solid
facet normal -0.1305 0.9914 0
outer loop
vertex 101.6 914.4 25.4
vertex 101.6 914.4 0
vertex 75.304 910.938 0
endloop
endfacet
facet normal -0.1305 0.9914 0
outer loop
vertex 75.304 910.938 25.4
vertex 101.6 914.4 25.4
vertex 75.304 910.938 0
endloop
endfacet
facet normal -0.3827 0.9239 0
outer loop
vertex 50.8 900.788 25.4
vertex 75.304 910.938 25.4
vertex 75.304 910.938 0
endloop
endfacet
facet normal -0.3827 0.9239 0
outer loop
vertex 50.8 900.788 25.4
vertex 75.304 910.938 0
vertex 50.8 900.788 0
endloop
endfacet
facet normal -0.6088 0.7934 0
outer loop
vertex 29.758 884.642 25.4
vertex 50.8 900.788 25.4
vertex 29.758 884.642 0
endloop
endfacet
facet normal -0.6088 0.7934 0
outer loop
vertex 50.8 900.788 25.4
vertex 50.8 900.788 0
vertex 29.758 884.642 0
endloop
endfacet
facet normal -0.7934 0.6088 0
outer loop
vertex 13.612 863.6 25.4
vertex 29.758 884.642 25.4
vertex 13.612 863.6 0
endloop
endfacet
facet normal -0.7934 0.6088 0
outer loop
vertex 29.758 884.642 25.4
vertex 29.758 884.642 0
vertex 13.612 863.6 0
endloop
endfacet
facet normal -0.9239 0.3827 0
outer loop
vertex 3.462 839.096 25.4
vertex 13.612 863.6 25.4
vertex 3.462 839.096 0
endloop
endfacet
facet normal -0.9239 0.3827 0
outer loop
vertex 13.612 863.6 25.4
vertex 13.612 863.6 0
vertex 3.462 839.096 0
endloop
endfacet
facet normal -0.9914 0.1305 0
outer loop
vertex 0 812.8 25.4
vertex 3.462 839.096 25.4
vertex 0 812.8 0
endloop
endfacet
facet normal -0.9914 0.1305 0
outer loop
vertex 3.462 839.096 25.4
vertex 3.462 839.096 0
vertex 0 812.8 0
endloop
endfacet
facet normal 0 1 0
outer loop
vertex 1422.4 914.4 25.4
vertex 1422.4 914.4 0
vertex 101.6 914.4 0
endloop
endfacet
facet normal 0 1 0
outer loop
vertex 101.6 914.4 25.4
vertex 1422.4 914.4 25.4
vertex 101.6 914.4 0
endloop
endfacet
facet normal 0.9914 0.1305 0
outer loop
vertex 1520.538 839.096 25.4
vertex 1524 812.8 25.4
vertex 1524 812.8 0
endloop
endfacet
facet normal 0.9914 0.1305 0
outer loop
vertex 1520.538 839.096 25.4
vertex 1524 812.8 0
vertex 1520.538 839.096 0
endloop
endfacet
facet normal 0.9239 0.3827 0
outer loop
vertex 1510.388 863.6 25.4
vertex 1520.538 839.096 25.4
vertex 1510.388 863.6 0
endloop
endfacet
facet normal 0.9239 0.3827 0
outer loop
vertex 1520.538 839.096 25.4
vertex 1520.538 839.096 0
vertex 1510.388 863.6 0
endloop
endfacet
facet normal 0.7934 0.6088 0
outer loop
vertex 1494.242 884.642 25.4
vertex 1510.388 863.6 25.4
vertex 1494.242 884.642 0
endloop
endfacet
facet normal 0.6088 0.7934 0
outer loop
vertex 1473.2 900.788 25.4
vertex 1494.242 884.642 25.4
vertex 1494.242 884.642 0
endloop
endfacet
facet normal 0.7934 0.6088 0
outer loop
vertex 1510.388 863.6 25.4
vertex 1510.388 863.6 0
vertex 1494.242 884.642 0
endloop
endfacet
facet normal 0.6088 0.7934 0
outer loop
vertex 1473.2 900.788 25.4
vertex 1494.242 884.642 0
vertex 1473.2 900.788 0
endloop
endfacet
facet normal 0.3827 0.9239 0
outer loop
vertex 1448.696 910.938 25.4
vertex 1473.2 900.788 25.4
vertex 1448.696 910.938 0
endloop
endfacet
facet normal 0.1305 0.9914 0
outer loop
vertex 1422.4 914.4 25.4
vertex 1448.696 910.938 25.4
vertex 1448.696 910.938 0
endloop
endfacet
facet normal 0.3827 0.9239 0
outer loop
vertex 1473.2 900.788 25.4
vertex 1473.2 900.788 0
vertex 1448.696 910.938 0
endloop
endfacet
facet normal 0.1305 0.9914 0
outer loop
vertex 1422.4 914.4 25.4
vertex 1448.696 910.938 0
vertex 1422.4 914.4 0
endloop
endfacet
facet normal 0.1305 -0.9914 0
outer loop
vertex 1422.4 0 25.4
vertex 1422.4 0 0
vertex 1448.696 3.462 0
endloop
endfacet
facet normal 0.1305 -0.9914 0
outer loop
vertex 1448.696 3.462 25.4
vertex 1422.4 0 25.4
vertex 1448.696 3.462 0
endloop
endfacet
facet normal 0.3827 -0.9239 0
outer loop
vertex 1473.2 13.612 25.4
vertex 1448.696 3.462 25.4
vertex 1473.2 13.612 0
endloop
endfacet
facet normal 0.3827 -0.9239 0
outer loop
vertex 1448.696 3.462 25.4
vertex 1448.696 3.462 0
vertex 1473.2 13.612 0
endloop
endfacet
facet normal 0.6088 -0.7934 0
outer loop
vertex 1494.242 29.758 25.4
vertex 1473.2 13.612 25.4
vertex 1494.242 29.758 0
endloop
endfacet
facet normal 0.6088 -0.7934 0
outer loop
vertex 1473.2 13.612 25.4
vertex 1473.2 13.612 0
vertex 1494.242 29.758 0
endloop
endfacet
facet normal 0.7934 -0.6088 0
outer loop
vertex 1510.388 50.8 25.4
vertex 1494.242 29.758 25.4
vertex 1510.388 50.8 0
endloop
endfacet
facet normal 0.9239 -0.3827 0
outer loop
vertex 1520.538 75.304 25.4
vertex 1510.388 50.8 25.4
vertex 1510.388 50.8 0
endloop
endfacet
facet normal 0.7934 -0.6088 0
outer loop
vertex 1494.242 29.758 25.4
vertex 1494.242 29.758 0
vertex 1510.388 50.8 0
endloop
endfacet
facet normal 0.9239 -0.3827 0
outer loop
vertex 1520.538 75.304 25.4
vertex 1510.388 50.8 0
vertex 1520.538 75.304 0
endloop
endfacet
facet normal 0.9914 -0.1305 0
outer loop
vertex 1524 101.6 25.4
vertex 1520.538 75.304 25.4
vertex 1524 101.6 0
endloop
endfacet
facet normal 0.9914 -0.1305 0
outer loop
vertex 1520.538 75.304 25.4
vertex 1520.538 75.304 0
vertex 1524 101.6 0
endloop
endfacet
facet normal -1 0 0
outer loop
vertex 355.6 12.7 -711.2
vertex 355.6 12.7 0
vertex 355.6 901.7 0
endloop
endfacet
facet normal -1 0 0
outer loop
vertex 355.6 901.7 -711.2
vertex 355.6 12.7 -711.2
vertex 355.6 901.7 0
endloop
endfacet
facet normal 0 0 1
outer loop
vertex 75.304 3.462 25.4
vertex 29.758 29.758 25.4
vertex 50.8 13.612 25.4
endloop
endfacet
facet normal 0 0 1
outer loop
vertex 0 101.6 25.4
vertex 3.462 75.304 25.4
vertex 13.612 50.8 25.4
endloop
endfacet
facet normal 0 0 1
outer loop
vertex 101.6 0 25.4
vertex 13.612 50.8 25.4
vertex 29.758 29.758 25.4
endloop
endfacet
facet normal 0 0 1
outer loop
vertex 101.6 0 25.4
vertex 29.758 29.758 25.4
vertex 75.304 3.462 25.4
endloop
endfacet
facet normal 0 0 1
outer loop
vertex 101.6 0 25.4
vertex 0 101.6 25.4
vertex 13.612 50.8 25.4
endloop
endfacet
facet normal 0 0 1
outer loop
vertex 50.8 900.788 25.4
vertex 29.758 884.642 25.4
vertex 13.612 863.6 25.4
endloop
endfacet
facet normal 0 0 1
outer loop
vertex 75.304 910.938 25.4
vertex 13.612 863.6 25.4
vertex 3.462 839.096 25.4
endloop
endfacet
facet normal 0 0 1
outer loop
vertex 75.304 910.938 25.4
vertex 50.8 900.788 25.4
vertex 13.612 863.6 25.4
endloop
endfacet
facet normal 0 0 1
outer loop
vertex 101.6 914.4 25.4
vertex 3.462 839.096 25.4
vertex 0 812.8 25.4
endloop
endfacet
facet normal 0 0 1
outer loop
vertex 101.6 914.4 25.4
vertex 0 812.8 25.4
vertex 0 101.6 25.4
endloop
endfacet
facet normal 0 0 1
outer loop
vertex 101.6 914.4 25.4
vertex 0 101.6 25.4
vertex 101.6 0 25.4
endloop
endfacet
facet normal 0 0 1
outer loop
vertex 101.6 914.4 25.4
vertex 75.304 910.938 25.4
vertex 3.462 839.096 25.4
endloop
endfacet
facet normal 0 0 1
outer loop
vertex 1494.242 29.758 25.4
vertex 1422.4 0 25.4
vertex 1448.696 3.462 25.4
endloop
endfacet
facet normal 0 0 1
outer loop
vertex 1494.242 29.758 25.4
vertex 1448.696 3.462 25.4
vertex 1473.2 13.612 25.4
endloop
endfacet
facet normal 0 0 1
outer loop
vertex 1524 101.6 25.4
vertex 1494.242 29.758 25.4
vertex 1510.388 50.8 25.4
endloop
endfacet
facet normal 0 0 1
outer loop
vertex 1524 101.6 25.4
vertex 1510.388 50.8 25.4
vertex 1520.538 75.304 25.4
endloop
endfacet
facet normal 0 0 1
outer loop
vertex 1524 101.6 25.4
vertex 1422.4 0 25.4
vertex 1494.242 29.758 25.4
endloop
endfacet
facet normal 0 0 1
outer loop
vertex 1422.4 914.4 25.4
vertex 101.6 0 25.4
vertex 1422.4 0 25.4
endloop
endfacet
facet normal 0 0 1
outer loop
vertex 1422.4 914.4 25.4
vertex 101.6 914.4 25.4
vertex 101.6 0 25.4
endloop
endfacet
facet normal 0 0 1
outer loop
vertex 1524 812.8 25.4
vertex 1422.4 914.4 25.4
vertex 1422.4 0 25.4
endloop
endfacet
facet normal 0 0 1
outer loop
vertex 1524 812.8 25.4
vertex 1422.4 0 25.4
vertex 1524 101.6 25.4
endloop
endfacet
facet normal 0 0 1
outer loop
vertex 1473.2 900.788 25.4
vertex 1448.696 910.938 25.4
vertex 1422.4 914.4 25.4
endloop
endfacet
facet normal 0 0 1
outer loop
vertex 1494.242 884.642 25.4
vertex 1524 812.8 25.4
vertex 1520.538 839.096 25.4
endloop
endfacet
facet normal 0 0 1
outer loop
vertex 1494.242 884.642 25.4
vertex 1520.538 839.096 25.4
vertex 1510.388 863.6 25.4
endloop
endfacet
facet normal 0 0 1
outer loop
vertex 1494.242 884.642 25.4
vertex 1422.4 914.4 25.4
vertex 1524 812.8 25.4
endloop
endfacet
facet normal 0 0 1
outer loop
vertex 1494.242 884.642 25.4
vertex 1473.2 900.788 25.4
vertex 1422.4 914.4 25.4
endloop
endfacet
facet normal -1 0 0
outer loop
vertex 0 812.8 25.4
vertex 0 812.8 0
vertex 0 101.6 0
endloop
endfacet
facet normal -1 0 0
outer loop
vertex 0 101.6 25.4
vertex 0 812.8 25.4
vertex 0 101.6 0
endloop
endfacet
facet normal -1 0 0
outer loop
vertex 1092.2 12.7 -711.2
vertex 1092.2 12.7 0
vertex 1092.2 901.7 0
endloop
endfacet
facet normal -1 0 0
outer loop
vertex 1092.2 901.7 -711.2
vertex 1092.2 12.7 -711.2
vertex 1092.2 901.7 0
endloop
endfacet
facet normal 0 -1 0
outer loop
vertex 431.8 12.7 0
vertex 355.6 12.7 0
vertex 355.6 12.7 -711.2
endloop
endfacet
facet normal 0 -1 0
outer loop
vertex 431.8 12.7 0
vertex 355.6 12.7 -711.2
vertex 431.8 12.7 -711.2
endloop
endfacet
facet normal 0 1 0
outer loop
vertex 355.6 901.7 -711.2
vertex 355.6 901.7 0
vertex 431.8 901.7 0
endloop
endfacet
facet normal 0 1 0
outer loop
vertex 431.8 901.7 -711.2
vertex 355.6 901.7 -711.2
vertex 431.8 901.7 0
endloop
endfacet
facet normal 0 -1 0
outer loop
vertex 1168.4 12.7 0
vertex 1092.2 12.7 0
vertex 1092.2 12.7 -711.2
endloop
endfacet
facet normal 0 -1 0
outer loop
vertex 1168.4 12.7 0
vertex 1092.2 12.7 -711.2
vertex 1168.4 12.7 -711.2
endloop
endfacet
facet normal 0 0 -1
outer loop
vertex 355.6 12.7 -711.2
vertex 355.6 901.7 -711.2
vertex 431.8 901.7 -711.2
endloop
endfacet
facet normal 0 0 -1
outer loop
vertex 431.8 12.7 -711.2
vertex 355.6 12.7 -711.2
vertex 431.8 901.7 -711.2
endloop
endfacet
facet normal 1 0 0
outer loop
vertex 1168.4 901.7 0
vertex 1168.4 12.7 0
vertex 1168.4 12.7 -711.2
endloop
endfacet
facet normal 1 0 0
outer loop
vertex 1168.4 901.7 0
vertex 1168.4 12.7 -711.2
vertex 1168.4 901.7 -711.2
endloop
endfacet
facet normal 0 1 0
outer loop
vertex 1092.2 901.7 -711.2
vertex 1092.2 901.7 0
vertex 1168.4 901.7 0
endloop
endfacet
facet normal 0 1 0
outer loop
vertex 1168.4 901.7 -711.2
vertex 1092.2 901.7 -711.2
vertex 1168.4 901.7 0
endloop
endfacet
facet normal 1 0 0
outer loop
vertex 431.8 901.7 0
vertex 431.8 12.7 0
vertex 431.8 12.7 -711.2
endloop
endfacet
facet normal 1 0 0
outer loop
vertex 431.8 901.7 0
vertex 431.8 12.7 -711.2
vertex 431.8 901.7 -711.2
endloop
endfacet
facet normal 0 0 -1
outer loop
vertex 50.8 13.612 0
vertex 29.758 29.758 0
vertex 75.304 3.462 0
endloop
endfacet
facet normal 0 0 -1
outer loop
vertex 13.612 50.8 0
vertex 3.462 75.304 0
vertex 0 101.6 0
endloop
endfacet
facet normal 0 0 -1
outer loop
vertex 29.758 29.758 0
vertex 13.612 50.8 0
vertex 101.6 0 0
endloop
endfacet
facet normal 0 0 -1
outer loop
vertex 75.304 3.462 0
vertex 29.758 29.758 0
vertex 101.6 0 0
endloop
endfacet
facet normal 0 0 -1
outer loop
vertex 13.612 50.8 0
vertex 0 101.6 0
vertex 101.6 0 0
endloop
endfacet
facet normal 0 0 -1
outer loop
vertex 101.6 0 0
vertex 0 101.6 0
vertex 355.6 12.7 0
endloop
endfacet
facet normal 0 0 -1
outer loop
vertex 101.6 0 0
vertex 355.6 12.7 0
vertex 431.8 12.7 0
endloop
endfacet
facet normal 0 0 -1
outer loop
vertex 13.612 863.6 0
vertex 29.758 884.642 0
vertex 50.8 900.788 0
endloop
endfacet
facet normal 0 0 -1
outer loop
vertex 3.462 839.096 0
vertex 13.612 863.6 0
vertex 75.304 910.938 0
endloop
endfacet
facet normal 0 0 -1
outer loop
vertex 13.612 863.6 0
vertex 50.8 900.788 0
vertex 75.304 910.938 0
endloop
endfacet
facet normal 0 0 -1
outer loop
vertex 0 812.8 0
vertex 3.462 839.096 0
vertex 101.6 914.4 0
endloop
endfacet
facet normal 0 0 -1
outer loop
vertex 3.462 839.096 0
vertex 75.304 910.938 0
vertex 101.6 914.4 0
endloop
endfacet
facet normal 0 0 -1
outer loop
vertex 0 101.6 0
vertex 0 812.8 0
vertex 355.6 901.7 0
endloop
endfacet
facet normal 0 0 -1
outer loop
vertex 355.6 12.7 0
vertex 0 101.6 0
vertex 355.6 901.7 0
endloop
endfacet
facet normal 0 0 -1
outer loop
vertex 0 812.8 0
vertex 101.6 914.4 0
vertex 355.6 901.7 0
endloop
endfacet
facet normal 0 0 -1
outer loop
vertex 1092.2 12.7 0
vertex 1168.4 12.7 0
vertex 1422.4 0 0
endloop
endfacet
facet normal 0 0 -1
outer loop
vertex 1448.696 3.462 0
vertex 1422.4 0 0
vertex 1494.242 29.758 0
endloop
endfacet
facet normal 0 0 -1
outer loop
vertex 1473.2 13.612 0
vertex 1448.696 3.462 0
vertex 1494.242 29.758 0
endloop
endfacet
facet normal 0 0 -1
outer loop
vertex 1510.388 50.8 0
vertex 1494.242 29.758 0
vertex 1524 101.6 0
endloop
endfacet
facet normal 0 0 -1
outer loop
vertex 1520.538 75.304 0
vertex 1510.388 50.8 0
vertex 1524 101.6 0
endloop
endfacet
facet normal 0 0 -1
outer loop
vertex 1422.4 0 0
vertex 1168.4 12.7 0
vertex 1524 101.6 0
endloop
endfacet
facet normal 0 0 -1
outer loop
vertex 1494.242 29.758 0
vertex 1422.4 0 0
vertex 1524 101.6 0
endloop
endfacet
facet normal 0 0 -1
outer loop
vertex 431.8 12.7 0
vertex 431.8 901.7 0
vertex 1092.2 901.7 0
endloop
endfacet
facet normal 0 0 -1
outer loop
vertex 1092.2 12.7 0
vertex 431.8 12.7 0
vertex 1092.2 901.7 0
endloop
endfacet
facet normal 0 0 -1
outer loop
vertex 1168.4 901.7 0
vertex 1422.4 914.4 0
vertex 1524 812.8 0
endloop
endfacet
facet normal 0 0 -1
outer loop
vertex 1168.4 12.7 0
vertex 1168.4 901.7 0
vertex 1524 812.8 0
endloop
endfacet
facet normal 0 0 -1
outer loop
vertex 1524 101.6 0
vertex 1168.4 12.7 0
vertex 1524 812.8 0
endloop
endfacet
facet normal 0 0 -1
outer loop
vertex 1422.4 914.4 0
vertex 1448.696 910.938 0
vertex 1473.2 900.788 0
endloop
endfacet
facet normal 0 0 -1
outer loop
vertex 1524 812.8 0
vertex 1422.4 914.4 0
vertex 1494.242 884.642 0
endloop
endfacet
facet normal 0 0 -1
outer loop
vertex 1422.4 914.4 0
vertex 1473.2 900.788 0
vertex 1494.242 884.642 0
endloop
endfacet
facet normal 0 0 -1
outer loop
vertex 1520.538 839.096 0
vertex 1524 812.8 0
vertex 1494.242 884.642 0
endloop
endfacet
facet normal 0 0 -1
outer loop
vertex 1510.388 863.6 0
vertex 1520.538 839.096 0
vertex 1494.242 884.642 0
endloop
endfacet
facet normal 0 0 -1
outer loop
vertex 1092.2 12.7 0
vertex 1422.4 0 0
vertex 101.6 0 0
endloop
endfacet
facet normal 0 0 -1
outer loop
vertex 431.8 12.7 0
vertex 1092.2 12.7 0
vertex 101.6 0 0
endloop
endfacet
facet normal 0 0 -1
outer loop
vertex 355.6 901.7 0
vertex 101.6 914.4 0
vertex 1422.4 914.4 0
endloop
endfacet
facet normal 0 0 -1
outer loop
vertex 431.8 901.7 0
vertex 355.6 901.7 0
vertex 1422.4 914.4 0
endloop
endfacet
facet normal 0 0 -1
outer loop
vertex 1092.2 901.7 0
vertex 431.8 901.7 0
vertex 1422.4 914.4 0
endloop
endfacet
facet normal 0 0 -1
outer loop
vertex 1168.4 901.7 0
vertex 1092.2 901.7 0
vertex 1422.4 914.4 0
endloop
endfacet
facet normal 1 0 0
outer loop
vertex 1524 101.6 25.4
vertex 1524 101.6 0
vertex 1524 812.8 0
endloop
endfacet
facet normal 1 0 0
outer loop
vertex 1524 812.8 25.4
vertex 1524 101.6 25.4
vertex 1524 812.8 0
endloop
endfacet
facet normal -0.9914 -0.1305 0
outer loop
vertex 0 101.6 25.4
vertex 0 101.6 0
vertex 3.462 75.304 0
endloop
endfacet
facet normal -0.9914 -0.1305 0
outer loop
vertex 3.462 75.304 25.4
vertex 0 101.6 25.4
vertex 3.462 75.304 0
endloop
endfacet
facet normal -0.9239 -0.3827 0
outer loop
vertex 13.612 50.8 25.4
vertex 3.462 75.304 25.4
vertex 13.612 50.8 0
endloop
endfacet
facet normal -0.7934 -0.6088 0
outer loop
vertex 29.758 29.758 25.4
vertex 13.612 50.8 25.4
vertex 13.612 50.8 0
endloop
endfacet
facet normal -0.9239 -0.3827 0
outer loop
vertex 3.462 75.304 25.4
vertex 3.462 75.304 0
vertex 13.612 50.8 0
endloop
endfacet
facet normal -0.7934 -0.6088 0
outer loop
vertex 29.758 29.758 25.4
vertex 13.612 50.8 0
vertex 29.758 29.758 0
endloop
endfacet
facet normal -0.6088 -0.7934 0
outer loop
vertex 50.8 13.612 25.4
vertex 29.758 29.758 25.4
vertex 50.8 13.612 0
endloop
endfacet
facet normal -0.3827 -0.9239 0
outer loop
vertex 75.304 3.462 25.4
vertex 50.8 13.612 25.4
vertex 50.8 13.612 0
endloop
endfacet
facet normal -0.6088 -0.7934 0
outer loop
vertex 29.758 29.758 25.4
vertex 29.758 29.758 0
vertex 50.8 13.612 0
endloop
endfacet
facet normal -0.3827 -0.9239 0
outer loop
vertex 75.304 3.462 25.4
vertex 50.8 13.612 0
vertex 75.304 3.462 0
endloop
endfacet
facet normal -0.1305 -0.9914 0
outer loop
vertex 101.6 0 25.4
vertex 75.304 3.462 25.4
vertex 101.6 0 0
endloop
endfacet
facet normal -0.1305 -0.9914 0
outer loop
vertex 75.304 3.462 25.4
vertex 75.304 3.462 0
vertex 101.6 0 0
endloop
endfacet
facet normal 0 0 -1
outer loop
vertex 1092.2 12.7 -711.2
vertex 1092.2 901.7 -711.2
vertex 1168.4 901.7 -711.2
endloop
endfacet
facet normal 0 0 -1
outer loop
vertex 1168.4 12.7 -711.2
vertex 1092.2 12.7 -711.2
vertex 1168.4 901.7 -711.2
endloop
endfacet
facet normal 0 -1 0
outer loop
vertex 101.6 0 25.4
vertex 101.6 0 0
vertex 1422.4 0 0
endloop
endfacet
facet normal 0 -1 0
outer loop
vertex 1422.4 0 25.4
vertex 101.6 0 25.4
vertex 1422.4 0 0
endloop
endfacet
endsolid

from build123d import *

# Parameters (mm, degrees)
F2_DEPTH = 25.4
F1_W     = 76.2
F1_H     = 889
F3_DEPTH = 711.2


with BuildPart() as f2:
    # F0 (on Top) → F2 (new body)
    with BuildSketch(Plane.XY):
        with BuildLine():
            ThreePointArc((0, 101.6), (29.757951, 29.757951), (101.6, 0))
            Line((101.6, 0), (1422.4, 0))
            ThreePointArc((1422.4, 0), (1494.242049, 29.757951), (1524, 101.6))
            Line((1524, 101.6), (1524, 812.8))
            ThreePointArc((1524, 812.8), (1494.242049, 884.642049), (1422.4, 914.4))
            Line((1422.4, 914.4), (101.6, 914.4))
            ThreePointArc((101.6, 914.4), (29.757951, 884.642049), (0, 812.8))
            Line((0, 812.8), (0, 101.6))
        make_face()
    extrude(amount=F2_DEPTH)

    # F1 (on Top) → F3 (join)
    with BuildSketch(Plane.XY):
        with Locations((393.7, 457.2)):
            Rectangle(F1_W, F1_H)
        with Locations((1130.3, 457.2)):
            Rectangle(F1_W, F1_H)
    extrude(amount=-F3_DEPTH)


solid = f2.part
